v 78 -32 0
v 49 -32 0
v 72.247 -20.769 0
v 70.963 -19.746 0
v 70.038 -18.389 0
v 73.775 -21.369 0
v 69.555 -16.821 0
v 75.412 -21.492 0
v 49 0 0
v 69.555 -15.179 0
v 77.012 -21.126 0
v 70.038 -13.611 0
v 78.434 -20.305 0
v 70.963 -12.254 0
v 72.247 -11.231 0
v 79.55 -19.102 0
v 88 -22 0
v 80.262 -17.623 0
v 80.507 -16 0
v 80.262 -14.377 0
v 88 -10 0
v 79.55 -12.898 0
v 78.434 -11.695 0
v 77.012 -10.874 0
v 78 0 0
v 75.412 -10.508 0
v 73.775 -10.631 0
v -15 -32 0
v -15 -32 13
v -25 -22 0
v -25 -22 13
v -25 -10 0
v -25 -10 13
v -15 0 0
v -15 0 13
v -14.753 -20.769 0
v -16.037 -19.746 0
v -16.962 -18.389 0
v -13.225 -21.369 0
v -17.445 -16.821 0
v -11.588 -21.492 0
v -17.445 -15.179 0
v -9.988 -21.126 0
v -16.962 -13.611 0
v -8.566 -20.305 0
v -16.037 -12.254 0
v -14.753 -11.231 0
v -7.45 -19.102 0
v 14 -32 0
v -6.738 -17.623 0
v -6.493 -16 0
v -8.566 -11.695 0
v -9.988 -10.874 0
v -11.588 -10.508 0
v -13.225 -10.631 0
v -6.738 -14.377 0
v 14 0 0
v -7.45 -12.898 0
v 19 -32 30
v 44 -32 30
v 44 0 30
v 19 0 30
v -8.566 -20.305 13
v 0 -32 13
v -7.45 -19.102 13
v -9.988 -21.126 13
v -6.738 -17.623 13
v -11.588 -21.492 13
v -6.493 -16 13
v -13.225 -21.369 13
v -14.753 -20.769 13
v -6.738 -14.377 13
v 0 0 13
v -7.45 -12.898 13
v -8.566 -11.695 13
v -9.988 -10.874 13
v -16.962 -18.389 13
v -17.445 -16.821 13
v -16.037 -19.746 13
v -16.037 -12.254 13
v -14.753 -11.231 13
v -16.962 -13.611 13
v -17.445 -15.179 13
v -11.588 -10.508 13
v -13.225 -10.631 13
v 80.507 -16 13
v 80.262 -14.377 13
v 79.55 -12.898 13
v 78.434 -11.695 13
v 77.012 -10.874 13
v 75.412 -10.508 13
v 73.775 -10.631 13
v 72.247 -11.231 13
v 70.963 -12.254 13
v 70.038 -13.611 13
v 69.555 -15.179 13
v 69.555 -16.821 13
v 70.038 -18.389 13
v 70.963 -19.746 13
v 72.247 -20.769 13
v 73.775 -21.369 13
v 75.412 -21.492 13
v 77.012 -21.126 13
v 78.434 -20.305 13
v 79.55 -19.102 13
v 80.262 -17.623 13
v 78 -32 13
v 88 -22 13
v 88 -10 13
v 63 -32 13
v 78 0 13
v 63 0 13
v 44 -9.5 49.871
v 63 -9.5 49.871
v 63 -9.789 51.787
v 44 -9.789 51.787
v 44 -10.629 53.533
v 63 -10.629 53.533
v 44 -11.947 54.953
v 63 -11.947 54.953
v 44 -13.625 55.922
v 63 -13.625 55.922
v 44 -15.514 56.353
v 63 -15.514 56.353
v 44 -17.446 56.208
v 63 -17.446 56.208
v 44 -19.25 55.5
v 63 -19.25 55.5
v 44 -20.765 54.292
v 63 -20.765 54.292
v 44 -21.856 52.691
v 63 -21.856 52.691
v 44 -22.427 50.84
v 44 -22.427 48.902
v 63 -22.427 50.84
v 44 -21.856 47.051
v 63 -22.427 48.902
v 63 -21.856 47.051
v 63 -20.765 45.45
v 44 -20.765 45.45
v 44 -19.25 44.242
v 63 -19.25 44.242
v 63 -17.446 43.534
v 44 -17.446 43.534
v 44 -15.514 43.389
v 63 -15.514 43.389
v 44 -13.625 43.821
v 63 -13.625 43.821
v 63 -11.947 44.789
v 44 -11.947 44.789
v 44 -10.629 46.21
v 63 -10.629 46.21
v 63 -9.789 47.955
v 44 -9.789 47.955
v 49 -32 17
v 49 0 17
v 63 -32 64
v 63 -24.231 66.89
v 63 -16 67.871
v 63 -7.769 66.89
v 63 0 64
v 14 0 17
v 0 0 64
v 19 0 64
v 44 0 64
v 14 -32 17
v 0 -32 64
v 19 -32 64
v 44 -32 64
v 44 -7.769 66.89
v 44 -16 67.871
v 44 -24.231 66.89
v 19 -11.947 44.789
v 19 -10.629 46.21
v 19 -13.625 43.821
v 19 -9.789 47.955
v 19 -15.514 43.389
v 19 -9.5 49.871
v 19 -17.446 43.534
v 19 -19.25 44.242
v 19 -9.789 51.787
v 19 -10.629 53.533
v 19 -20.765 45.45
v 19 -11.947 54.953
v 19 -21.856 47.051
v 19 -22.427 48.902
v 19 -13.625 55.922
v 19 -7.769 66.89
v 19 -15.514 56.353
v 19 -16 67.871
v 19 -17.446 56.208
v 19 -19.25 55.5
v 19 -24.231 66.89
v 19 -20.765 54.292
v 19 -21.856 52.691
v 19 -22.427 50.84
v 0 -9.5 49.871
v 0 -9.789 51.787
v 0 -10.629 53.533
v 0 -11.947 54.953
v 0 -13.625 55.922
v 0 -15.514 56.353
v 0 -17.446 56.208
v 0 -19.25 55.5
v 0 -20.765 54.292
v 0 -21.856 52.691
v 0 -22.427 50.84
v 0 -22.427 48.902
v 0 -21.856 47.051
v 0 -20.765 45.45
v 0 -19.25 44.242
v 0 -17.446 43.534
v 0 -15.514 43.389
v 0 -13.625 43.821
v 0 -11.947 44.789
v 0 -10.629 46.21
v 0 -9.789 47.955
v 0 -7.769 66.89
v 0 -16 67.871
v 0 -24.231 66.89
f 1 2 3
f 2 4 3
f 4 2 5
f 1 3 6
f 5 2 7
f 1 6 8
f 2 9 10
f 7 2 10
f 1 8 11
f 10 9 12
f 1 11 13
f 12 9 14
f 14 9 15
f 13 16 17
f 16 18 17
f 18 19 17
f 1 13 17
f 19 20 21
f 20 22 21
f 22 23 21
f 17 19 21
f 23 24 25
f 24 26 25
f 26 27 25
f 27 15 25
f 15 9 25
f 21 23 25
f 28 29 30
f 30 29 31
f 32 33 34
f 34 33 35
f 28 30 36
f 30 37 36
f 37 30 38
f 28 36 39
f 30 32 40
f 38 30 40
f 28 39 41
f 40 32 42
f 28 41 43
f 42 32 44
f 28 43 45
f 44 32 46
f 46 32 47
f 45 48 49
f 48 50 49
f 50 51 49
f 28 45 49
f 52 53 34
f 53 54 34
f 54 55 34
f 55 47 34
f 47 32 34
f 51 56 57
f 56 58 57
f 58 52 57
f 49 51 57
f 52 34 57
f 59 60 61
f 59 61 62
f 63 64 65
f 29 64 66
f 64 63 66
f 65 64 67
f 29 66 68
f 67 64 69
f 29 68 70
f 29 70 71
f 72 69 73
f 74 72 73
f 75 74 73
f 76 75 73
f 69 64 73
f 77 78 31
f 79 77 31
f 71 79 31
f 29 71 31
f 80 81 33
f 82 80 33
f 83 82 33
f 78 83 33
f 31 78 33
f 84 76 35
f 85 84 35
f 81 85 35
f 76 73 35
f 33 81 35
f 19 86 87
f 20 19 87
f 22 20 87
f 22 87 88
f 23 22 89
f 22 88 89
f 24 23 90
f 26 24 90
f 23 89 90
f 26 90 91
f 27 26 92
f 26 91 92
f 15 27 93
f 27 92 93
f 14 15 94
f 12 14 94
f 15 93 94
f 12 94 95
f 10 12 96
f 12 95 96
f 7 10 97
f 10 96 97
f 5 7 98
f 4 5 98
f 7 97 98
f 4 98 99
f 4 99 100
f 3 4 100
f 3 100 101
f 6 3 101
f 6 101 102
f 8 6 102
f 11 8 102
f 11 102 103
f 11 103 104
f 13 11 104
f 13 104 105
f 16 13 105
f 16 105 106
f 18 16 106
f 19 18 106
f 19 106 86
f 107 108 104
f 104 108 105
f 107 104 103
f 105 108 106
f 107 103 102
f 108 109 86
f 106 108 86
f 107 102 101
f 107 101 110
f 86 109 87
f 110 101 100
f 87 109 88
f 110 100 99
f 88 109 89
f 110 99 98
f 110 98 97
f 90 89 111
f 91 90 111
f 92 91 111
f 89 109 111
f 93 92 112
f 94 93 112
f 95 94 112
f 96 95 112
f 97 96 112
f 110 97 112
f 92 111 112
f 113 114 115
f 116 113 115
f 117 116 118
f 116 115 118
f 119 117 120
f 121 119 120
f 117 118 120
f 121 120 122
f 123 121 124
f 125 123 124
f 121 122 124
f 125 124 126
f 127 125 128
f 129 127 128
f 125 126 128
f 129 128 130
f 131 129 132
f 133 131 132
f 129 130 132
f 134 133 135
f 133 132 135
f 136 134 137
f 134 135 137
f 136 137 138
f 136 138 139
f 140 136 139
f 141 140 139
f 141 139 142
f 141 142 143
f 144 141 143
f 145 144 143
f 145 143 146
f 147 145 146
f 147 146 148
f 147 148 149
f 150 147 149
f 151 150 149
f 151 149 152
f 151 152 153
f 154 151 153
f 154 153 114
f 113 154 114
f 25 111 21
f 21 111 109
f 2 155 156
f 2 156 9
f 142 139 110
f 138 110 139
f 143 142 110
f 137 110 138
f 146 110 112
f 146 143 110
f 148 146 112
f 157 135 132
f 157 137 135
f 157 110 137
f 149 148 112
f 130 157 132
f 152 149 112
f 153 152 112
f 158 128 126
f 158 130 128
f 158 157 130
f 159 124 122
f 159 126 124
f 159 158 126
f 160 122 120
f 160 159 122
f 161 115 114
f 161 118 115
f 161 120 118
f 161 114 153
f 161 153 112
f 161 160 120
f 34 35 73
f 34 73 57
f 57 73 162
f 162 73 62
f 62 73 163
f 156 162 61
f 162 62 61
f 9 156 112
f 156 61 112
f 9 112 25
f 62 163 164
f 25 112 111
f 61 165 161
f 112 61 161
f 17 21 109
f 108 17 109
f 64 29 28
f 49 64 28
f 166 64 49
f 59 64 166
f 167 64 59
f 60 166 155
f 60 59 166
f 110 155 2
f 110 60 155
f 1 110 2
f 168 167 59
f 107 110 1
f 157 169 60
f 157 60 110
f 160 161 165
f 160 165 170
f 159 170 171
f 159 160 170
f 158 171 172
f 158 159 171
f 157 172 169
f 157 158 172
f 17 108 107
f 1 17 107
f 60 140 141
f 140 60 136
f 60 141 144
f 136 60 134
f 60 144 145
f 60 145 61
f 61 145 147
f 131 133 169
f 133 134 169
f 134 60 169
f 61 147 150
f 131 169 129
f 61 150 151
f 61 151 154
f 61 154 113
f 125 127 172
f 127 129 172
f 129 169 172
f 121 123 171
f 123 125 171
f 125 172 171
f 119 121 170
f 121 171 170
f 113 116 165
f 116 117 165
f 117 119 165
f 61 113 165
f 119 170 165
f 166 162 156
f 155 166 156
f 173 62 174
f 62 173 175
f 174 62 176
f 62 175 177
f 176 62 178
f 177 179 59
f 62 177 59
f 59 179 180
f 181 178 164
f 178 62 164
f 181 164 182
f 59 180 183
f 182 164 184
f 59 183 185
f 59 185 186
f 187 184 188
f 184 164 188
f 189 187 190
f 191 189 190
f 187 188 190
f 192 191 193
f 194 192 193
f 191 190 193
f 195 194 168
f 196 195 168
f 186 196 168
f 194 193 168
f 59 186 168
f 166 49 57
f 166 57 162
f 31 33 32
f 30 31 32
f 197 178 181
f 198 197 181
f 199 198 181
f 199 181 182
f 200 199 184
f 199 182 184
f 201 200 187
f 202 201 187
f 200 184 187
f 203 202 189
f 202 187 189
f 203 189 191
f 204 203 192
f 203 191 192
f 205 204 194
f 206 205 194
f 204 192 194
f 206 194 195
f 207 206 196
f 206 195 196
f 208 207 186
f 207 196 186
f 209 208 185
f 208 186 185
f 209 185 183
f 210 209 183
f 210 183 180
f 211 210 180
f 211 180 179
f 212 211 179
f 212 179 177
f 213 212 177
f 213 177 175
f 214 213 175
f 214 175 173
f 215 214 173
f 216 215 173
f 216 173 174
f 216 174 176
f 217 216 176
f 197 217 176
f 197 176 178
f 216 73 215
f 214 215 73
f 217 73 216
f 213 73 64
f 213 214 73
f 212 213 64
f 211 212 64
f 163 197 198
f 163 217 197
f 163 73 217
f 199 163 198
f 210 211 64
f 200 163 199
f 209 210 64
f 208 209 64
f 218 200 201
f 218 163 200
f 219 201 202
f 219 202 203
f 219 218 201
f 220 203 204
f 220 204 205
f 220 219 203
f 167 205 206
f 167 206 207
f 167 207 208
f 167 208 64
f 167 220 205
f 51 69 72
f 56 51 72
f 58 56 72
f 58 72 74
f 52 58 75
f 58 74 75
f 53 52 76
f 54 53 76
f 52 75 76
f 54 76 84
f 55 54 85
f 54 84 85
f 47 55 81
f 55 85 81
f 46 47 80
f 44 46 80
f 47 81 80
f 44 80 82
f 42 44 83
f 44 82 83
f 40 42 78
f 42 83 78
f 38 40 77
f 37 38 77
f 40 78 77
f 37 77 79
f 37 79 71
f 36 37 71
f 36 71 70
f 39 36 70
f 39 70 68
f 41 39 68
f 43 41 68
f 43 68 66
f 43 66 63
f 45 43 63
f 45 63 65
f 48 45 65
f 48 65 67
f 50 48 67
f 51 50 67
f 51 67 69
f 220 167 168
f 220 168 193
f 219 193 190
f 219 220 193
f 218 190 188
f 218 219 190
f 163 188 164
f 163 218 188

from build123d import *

# Parameters (mm, degrees)
F1_DEPTH  = 32
F3_DEPTH  = 19
F5_DEPTH  = 19
F7_DEPTH  = 25
F8_R      = 5.506936
F9_DEPTH  = 13.001
F10_R     = 6.5
F11_DEPTH = 88.001


with BuildPart() as f1:
    # F0 (on Front) → F1 (new body)
    with BuildSketch(Plane.XZ):
        Polygon((-25, 13), (-25, 0), (14, 0), (14, 17), (49, 17), (49, 0), (88, 0), (88, 13), (63, 13), (63, 64), (44, 64), (44, 30), (19, 30), (19, 64), (0, 64), (0, 13), align=None)
    extrude(amount=F1_DEPTH)

    # F2 (on face) → F3 (join)
    with BuildSketch(Plane.YZ.offset(63)):
        with BuildLine():
            Line((-32, 64), (0, 64))
            ThreePointArc((0, 64), (-16, 67.871235), (-32, 64))
        make_face()
    extrude(amount=-F3_DEPTH)

    # F4 (on face) → F5 (join)
    with BuildSketch(Plane(origin=(0, 0, 0), x_dir=(0, -1, 0), z_dir=(-1, 0, 0))):
        with BuildLine():
            Line((0, 64), (32, 64))
            ThreePointArc((32, 64), (16, 67.871235), (0, 64))
        make_face()
    extrude(amount=-F5_DEPTH)

    # F6 (on face) → F7 (cut)
    with BuildSketch(Plane.XY.offset(13)):
        Polygon((-25, -10), (-15, 0), (-25, 0), align=None)
        Polygon((-25, -22), (-25, -32), (-15, -32), align=None)
    extrude(amount=-F7_DEPTH, mode=Mode.SUBTRACT)

    # F8 (on face) → F9 (cut, through all)
    with BuildSketch(Plane.XY.offset(13)):
        with Locations((75, -16)):
            Circle(F8_R)
        Polygon((88, 0), (78, 0), (88, -10), align=None)
        Polygon((88, -32), (88, -22), (78, -32), align=None)
        with Locations((-12, -16)):
            Circle(F8_R)
    extrude(amount=-F9_DEPTH, mode=Mode.SUBTRACT)

    # F10 (on face) → F11 (cut, through all)
    with BuildSketch(Plane.YZ.offset(63)):
        with Locations((-16, 49.871235)):
            Circle(F10_R)
    extrude(amount=-F11_DEPTH, mode=Mode.SUBTRACT)


solid = f1.part
